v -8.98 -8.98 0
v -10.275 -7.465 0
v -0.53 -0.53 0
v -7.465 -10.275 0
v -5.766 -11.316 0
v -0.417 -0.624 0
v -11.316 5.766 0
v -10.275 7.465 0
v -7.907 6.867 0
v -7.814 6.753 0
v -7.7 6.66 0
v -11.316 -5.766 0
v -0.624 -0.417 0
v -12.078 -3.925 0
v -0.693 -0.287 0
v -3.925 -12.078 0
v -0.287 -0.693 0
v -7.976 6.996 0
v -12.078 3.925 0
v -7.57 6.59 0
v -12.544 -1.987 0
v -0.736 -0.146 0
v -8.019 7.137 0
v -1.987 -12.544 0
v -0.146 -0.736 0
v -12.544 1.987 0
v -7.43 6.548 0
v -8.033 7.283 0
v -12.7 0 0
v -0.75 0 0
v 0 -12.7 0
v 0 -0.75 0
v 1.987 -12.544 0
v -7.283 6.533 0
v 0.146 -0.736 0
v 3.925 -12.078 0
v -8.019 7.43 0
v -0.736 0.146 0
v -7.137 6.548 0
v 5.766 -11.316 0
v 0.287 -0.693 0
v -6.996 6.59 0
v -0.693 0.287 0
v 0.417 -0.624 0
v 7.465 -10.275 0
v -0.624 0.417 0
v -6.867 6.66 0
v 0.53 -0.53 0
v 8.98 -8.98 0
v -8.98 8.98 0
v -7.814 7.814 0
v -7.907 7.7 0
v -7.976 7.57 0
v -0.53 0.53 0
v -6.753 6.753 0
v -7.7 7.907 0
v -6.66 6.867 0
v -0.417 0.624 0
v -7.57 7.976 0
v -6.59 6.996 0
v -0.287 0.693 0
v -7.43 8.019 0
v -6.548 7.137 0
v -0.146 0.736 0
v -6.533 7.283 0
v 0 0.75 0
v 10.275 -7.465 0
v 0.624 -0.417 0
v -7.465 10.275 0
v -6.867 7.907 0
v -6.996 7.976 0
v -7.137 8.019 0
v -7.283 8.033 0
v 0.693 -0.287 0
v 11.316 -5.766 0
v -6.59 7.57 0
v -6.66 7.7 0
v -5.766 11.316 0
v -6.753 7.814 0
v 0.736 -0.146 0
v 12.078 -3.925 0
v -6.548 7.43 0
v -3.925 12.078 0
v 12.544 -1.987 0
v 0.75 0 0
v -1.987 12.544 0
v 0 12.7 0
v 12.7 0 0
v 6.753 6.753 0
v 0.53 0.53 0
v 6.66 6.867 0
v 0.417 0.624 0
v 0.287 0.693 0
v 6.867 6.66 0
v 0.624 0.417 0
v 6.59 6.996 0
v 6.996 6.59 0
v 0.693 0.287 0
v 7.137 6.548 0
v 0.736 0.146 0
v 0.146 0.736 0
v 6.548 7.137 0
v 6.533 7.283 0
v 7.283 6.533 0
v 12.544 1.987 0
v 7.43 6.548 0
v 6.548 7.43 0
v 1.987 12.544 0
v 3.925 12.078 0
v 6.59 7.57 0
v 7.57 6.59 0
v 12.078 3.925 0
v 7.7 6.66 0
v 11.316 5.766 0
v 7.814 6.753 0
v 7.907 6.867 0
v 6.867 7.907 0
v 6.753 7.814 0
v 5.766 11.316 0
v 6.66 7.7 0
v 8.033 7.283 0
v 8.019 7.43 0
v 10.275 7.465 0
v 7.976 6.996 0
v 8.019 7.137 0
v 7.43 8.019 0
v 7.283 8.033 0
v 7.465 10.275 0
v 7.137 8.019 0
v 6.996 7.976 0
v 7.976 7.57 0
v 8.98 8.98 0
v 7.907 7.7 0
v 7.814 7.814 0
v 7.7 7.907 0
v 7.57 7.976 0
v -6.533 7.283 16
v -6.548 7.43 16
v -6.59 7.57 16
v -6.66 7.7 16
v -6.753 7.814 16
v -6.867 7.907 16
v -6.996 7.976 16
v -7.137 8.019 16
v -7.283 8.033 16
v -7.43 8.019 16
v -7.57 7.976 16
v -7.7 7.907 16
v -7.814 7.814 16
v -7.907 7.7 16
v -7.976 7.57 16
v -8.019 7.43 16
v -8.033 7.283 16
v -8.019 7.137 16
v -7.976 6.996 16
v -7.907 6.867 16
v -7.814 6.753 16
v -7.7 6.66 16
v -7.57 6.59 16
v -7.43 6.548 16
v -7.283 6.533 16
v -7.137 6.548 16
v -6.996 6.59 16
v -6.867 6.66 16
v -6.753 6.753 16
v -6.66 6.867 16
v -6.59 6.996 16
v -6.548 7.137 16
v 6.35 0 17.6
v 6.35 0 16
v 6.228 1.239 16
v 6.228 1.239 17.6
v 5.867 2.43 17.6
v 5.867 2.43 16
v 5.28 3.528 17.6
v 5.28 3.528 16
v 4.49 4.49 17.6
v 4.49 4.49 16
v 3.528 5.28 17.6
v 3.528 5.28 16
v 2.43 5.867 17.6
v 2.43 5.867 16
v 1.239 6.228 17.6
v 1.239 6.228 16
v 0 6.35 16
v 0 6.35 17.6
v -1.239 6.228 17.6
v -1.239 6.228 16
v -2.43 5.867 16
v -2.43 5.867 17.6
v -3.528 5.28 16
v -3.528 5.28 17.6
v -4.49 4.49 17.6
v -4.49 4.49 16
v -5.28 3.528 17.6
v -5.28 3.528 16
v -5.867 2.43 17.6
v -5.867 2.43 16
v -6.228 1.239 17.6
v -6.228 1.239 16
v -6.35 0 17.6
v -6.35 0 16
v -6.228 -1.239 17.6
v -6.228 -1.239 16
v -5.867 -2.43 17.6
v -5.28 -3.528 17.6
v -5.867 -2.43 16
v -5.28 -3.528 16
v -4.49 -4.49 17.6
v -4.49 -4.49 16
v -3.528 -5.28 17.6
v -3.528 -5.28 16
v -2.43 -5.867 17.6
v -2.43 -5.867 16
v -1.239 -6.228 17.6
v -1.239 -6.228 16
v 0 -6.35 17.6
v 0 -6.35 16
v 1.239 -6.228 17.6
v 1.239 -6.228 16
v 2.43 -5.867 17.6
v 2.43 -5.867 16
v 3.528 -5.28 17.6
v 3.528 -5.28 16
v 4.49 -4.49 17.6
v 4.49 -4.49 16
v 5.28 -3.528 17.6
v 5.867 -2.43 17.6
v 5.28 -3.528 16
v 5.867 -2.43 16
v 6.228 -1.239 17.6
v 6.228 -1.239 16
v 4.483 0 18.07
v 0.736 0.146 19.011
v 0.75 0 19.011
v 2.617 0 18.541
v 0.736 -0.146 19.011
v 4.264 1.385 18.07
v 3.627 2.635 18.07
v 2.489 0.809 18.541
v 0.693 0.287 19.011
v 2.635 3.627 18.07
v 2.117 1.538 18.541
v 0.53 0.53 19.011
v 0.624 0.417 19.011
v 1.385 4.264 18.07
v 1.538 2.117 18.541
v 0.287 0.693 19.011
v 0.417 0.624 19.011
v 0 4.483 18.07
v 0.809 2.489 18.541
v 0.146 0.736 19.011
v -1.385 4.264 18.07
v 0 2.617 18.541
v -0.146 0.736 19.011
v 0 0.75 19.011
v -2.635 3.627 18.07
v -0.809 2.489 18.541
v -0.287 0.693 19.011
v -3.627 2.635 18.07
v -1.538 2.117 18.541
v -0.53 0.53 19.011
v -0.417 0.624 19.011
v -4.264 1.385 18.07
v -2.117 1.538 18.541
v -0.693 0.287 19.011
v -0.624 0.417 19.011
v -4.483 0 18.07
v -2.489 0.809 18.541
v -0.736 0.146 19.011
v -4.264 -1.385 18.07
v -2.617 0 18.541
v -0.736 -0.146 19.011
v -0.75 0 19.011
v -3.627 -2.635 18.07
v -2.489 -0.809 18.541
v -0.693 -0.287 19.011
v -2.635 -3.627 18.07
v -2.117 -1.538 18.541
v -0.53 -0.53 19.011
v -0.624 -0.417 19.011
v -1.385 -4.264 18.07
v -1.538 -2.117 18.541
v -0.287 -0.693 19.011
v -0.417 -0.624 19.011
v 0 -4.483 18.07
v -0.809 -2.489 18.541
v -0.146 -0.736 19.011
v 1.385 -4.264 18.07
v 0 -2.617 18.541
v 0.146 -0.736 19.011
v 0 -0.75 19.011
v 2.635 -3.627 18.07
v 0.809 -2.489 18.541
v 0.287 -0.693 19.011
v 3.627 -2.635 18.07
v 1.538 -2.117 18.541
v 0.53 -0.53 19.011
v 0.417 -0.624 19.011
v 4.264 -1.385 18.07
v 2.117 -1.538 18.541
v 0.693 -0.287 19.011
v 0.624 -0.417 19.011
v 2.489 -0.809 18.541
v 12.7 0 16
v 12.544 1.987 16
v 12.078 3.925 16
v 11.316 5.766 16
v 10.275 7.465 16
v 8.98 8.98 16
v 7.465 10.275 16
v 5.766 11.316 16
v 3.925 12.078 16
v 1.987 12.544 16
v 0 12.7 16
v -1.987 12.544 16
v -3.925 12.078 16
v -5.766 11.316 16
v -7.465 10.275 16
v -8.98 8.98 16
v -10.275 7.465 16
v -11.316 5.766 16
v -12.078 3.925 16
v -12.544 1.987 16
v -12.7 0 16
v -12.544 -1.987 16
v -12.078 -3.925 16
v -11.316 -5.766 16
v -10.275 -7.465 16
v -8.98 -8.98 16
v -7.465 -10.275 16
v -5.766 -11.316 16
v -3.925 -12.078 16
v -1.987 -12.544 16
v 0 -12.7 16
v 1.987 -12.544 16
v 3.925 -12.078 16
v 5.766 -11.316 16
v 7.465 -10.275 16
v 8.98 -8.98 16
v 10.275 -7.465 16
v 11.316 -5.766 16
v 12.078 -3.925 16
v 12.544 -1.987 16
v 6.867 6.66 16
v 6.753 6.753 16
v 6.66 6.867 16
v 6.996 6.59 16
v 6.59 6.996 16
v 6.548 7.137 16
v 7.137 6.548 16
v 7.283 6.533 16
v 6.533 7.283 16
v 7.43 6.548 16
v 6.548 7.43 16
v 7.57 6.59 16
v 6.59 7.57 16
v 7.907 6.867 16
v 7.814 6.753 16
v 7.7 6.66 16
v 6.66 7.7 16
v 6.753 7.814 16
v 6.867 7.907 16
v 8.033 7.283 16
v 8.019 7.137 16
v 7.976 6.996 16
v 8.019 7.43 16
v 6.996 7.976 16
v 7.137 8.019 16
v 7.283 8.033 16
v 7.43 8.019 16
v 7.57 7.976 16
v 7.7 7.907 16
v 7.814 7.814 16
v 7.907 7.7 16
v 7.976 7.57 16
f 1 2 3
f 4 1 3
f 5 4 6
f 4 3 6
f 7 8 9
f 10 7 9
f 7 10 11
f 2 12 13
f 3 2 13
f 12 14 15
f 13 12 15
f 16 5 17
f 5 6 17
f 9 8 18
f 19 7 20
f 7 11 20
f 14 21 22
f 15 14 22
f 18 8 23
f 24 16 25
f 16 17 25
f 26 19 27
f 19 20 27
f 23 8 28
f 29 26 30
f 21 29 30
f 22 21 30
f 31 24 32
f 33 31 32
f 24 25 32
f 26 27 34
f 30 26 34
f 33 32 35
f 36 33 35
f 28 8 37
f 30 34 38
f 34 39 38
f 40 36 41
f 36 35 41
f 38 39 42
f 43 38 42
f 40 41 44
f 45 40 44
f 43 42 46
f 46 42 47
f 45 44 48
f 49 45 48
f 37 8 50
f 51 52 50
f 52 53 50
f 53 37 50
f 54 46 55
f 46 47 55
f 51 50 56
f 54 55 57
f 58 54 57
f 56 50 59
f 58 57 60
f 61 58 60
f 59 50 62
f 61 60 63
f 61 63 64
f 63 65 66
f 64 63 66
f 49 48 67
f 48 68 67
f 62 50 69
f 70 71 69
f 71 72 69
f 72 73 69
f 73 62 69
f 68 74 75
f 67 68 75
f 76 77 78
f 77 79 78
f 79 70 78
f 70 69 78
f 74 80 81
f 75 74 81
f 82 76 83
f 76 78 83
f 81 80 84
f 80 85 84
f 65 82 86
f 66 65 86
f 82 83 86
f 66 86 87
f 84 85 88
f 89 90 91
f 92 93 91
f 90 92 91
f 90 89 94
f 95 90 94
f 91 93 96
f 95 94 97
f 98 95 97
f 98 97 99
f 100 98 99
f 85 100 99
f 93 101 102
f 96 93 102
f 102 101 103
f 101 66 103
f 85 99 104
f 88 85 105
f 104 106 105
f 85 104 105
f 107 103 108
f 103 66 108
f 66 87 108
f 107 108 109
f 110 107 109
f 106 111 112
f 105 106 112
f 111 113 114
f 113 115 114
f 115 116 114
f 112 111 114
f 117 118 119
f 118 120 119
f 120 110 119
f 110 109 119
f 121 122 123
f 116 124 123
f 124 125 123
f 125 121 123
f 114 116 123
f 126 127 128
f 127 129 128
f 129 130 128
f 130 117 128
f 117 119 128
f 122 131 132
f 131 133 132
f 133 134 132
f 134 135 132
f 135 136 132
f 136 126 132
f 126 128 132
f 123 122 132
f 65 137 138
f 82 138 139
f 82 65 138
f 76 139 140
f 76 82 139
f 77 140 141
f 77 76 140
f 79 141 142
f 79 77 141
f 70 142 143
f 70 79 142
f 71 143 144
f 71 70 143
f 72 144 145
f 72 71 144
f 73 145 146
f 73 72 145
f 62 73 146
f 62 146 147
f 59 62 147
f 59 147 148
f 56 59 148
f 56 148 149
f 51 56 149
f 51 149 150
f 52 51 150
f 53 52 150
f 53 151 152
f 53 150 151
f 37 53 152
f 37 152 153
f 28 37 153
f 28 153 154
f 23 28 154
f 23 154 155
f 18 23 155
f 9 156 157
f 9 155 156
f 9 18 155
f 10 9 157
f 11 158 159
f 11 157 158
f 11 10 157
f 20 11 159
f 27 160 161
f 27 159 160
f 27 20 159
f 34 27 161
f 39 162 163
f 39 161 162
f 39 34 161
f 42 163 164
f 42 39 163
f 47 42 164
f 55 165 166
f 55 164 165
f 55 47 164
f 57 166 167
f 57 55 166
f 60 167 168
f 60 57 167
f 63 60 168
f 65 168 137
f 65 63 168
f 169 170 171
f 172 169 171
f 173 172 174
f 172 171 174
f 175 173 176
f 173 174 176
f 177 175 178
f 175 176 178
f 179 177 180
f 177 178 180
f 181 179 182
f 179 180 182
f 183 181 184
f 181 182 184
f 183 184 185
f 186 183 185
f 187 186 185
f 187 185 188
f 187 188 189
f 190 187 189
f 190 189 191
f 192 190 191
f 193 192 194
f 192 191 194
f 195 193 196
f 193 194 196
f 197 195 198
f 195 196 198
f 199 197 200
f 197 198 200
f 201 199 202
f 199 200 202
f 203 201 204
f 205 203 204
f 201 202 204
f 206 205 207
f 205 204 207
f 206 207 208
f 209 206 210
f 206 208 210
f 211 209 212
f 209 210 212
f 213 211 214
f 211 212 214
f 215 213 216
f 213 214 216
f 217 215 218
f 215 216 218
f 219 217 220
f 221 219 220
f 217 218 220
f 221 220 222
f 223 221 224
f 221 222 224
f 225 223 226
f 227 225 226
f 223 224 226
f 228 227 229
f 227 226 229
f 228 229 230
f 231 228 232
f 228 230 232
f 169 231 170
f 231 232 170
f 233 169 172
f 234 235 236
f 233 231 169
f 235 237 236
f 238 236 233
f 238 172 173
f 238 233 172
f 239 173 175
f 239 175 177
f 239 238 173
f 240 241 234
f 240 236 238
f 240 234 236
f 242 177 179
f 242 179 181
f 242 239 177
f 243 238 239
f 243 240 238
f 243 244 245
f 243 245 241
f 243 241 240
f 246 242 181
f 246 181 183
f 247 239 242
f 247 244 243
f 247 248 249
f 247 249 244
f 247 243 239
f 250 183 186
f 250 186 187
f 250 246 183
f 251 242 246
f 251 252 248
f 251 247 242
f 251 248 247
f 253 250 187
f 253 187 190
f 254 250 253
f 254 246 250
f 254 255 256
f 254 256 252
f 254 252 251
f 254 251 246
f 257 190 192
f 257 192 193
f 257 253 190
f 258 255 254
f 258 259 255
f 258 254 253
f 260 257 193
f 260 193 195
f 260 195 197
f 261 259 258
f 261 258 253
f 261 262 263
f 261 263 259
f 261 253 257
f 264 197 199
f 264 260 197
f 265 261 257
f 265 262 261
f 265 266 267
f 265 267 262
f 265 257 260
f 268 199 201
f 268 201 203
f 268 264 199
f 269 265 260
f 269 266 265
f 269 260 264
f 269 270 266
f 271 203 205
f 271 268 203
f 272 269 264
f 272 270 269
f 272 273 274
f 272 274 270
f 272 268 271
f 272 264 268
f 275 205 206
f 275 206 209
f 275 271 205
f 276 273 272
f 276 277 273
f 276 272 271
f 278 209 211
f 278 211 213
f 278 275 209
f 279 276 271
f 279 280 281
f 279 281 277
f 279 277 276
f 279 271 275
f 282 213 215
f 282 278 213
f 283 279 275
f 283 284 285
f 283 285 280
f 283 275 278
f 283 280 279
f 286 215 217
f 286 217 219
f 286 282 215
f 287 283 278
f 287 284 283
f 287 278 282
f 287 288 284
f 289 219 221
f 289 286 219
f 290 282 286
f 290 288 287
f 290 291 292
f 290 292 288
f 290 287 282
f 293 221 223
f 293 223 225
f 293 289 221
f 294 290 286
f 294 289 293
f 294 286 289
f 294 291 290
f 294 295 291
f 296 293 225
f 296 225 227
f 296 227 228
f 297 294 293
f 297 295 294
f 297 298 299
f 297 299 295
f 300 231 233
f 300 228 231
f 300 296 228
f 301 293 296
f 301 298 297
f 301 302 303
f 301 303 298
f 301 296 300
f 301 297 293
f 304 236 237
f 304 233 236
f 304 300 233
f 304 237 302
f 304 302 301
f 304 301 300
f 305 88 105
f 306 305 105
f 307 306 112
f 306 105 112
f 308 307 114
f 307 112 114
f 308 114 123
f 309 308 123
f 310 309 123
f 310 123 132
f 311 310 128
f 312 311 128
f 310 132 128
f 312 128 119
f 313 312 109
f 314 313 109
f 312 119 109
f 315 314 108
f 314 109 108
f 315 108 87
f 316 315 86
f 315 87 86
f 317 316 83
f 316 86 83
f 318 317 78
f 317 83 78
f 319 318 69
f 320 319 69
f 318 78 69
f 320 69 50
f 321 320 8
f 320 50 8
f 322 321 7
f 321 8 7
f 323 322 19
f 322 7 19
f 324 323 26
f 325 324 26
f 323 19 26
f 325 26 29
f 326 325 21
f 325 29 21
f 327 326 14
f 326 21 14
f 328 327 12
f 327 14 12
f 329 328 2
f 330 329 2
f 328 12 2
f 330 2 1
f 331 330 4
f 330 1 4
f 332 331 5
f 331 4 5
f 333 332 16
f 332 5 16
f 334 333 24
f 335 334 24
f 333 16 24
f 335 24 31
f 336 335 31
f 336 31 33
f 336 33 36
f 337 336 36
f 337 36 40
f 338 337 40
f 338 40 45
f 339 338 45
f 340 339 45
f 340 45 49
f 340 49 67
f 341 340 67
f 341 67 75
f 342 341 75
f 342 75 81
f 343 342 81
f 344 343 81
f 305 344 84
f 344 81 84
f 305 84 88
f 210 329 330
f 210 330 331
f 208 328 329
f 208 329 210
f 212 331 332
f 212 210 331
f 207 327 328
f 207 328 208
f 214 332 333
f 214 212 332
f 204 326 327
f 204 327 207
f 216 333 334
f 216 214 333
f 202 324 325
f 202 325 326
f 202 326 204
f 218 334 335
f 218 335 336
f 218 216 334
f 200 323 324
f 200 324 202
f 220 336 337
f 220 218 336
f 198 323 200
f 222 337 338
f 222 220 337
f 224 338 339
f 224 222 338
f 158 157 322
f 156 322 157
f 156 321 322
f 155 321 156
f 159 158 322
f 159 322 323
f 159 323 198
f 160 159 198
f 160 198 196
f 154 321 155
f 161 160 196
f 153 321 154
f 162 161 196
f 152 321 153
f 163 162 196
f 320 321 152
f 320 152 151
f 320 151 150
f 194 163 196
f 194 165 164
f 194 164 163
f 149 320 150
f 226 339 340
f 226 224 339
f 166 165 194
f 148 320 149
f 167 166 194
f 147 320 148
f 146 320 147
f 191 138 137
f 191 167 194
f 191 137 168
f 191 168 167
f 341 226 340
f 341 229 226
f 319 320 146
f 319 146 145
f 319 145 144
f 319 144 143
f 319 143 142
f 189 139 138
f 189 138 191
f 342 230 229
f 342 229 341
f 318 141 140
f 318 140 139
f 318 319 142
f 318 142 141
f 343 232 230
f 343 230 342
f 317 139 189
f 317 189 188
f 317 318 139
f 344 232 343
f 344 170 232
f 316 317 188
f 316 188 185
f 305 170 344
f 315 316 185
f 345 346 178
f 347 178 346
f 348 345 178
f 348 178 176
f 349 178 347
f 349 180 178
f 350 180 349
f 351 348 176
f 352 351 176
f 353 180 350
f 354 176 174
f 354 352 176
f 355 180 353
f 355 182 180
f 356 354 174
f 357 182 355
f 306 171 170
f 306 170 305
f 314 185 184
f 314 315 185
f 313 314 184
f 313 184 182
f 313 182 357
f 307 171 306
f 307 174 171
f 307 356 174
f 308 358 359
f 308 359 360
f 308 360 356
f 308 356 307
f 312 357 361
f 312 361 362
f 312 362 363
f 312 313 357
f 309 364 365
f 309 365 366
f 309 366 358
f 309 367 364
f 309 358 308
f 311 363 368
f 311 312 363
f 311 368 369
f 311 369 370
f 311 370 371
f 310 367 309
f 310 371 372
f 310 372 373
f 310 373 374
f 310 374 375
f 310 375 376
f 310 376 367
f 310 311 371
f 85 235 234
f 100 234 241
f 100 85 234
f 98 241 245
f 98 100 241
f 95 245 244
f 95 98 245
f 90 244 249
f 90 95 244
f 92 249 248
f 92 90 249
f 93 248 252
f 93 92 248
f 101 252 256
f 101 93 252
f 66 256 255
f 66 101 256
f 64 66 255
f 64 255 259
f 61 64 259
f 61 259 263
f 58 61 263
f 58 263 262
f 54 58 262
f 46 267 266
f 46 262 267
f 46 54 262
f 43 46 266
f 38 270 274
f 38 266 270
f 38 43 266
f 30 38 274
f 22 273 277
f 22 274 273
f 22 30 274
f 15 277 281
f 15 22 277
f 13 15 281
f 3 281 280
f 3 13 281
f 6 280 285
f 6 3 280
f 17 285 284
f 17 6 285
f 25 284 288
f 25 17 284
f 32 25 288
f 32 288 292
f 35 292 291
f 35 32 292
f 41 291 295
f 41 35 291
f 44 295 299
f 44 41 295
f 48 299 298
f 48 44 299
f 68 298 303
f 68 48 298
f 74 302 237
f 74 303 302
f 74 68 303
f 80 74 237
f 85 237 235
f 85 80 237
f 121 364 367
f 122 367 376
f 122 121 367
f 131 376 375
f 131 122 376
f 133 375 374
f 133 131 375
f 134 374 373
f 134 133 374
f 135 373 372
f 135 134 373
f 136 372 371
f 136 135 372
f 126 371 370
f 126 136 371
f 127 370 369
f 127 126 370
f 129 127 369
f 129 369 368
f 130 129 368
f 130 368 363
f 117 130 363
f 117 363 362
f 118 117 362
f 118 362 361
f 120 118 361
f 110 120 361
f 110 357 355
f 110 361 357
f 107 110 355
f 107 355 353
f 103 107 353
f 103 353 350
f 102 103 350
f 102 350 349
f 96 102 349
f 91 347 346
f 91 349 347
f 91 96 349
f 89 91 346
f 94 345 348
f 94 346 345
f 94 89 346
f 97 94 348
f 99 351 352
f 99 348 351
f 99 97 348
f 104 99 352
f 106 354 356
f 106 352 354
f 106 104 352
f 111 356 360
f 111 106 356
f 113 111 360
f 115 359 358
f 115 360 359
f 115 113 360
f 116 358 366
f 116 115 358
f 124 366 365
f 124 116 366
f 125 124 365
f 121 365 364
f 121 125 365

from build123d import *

# Parameters (mm, degrees)
SKETCH_1_R               = 12.7
EXTRUDE_1_DEPTH          = 16
SKETCH_2_R               = 6.35
EXTRUDE_2_DEPTH          = 1.6
SKETCH_3_R               = 6.35
EXTRUDE_3_DEPTH          = 1.6
EXTRUDE_3_TAPER          = 75.857
CUT_EXTRUDE_1_DEPTH      = 25.053689946
CUT_EXTRUDE_1_DEPTH_BACK = 25.053689946
SKETCH_4_R               = 0.75
SKETCH_5_R               = 0.75
CUT_EXTRUDE_5_DEPTH      = 27.153424276


with BuildPart() as part:
    # Эскиз1 → Бобышка-Вытянуть1 (new body)
    with BuildSketch(Plane.XY):
        Circle(SKETCH_1_R)
    extrude(amount=EXTRUDE_1_DEPTH)

    # Эскиз2 → Бобышка-Вытянуть2 (add)
    with BuildSketch(Plane.XY.offset(16)):
        Circle(SKETCH_2_R)
    extrude(amount=EXTRUDE_2_DEPTH)

    # Эскиз3 → Бобышка-Вытянуть3 (add)
    with BuildSketch(Plane.XY.offset(17.6)):
        Circle(SKETCH_3_R)
    extrude(amount=EXTRUDE_3_DEPTH, taper=EXTRUDE_3_TAPER)

    # Эскиз4 → Вырез-Вытянуть1 (cut, two sides: drawn at the far end of the back side and taken through both)
    with BuildSketch(Plane.XY.offset(16).offset(-CUT_EXTRUDE_1_DEPTH_BACK)):
        Circle(SKETCH_4_R)
    extrude(amount=CUT_EXTRUDE_1_DEPTH + CUT_EXTRUDE_1_DEPTH_BACK, mode=Mode.SUBTRACT)

    # Эскиз5 → Вырез-Вытянуть5 (cut, through all)
    with BuildSketch(Plane.XY):
        with Locations((-7.283199846, 7.283199846)):
            Circle(SKETCH_5_R)
        with Locations((7.283199846, 7.283199846)):
            Circle(SKETCH_5_R)
    extrude(amount=CUT_EXTRUDE_5_DEPTH, mode=Mode.SUBTRACT)


solid = part.part
